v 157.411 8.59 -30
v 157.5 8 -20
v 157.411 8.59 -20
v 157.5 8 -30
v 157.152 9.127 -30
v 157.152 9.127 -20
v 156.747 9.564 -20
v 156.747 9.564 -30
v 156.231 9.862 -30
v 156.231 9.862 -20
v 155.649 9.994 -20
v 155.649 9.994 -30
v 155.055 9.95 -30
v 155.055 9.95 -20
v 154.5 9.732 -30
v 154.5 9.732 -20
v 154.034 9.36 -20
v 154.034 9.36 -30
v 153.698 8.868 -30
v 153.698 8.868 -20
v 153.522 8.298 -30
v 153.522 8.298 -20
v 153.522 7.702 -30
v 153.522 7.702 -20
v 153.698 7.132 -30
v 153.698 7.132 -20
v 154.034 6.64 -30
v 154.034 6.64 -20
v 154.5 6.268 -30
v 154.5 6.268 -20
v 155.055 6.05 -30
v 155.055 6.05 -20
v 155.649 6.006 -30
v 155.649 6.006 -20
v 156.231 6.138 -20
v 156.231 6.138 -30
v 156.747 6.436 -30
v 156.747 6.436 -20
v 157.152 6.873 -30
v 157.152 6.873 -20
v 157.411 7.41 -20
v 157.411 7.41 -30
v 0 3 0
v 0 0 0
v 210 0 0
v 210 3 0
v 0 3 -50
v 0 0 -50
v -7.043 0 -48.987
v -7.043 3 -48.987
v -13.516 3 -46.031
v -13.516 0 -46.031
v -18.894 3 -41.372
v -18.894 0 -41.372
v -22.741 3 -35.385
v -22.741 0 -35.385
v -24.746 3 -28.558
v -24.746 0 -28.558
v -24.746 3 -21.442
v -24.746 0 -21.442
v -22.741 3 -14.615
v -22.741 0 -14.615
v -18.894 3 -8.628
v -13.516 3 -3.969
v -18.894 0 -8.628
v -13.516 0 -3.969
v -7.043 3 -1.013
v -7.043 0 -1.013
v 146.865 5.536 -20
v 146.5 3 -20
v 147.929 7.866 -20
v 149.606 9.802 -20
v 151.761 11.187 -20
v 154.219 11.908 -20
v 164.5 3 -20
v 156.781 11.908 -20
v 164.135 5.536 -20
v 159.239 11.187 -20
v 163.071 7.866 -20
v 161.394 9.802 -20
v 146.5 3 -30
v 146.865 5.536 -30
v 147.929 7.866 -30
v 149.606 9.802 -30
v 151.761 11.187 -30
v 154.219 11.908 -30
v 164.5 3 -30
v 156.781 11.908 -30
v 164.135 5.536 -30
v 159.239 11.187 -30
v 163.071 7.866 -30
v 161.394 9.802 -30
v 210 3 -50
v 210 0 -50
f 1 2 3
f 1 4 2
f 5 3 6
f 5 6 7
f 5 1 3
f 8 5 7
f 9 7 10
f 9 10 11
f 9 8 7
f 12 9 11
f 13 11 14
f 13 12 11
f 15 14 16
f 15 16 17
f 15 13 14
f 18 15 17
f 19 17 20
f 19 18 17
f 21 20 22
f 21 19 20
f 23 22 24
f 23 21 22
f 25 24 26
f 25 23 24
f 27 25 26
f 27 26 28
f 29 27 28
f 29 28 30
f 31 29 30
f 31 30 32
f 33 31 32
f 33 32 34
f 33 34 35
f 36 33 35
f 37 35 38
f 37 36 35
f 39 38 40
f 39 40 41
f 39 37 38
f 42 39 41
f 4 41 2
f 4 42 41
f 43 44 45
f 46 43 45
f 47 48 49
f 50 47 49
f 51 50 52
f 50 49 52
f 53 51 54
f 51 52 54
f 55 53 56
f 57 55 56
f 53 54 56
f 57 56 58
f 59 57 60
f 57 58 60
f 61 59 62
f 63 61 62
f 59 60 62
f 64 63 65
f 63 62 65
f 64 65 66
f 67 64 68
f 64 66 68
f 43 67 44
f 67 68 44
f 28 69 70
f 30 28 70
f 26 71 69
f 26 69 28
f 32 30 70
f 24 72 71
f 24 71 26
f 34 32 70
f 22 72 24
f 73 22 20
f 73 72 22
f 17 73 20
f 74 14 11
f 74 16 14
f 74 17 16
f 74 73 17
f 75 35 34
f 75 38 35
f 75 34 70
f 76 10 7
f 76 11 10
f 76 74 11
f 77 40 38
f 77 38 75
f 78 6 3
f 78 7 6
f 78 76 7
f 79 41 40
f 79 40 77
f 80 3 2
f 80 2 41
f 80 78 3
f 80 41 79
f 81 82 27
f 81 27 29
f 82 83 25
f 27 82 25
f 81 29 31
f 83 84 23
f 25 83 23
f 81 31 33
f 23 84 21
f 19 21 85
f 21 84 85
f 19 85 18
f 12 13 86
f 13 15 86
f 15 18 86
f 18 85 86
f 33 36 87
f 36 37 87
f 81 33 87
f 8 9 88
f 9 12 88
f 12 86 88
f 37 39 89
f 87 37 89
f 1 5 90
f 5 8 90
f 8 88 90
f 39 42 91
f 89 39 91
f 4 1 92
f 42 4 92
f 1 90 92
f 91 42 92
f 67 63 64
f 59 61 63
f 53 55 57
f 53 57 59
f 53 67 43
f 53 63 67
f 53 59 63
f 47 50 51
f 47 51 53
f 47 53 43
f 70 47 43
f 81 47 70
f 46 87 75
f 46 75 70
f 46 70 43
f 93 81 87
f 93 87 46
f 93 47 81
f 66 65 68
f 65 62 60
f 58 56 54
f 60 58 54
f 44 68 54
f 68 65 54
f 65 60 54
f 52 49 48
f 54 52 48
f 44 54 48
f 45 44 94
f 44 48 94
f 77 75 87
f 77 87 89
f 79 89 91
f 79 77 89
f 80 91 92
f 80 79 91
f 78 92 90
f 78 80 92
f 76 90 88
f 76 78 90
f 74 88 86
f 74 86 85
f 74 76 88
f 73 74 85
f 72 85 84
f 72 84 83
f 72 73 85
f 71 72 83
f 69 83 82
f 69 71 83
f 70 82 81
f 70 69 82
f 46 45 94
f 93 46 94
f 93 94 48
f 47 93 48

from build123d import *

# Parameters (mm, degrees)
BOSS_EXTRUDE1_DEPTH = 3
SKETCH3_R           = 2
BOSS_EXTRUDE2_DEPTH = 5


with BuildPart() as part:
    # Sketch1 → Boss-Extrude1 (new body)
    with BuildSketch(Plane(origin=(0, 0, 0), x_dir=(1, 0, 0), z_dir=(0, 1, 0))):
        with BuildLine():
            Line((0, 0), (210, 0))
            Line((210, 0), (210, 50))
            Line((210, 50), (0, 50))
            ThreePointArc((0, 50), (-25, 25), (0, 0))
        make_face()
    extrude(amount=BOSS_EXTRUDE1_DEPTH)

    # Sketch3 → Boss-Extrude2 (add, symmetric)
    with BuildSketch(Plane.XY.offset(-25)):
        with BuildLine():
            Line((146.5, 3), (164.5, 3))
            ThreePointArc((164.5, 3), (155.5, 12), (146.5, 3))
        make_face()
        with Locations((155.5, 8)):
            Circle(SKETCH3_R, mode=Mode.SUBTRACT)
    extrude(amount=BOSS_EXTRUDE2_DEPTH, both=True)


solid = part.part
